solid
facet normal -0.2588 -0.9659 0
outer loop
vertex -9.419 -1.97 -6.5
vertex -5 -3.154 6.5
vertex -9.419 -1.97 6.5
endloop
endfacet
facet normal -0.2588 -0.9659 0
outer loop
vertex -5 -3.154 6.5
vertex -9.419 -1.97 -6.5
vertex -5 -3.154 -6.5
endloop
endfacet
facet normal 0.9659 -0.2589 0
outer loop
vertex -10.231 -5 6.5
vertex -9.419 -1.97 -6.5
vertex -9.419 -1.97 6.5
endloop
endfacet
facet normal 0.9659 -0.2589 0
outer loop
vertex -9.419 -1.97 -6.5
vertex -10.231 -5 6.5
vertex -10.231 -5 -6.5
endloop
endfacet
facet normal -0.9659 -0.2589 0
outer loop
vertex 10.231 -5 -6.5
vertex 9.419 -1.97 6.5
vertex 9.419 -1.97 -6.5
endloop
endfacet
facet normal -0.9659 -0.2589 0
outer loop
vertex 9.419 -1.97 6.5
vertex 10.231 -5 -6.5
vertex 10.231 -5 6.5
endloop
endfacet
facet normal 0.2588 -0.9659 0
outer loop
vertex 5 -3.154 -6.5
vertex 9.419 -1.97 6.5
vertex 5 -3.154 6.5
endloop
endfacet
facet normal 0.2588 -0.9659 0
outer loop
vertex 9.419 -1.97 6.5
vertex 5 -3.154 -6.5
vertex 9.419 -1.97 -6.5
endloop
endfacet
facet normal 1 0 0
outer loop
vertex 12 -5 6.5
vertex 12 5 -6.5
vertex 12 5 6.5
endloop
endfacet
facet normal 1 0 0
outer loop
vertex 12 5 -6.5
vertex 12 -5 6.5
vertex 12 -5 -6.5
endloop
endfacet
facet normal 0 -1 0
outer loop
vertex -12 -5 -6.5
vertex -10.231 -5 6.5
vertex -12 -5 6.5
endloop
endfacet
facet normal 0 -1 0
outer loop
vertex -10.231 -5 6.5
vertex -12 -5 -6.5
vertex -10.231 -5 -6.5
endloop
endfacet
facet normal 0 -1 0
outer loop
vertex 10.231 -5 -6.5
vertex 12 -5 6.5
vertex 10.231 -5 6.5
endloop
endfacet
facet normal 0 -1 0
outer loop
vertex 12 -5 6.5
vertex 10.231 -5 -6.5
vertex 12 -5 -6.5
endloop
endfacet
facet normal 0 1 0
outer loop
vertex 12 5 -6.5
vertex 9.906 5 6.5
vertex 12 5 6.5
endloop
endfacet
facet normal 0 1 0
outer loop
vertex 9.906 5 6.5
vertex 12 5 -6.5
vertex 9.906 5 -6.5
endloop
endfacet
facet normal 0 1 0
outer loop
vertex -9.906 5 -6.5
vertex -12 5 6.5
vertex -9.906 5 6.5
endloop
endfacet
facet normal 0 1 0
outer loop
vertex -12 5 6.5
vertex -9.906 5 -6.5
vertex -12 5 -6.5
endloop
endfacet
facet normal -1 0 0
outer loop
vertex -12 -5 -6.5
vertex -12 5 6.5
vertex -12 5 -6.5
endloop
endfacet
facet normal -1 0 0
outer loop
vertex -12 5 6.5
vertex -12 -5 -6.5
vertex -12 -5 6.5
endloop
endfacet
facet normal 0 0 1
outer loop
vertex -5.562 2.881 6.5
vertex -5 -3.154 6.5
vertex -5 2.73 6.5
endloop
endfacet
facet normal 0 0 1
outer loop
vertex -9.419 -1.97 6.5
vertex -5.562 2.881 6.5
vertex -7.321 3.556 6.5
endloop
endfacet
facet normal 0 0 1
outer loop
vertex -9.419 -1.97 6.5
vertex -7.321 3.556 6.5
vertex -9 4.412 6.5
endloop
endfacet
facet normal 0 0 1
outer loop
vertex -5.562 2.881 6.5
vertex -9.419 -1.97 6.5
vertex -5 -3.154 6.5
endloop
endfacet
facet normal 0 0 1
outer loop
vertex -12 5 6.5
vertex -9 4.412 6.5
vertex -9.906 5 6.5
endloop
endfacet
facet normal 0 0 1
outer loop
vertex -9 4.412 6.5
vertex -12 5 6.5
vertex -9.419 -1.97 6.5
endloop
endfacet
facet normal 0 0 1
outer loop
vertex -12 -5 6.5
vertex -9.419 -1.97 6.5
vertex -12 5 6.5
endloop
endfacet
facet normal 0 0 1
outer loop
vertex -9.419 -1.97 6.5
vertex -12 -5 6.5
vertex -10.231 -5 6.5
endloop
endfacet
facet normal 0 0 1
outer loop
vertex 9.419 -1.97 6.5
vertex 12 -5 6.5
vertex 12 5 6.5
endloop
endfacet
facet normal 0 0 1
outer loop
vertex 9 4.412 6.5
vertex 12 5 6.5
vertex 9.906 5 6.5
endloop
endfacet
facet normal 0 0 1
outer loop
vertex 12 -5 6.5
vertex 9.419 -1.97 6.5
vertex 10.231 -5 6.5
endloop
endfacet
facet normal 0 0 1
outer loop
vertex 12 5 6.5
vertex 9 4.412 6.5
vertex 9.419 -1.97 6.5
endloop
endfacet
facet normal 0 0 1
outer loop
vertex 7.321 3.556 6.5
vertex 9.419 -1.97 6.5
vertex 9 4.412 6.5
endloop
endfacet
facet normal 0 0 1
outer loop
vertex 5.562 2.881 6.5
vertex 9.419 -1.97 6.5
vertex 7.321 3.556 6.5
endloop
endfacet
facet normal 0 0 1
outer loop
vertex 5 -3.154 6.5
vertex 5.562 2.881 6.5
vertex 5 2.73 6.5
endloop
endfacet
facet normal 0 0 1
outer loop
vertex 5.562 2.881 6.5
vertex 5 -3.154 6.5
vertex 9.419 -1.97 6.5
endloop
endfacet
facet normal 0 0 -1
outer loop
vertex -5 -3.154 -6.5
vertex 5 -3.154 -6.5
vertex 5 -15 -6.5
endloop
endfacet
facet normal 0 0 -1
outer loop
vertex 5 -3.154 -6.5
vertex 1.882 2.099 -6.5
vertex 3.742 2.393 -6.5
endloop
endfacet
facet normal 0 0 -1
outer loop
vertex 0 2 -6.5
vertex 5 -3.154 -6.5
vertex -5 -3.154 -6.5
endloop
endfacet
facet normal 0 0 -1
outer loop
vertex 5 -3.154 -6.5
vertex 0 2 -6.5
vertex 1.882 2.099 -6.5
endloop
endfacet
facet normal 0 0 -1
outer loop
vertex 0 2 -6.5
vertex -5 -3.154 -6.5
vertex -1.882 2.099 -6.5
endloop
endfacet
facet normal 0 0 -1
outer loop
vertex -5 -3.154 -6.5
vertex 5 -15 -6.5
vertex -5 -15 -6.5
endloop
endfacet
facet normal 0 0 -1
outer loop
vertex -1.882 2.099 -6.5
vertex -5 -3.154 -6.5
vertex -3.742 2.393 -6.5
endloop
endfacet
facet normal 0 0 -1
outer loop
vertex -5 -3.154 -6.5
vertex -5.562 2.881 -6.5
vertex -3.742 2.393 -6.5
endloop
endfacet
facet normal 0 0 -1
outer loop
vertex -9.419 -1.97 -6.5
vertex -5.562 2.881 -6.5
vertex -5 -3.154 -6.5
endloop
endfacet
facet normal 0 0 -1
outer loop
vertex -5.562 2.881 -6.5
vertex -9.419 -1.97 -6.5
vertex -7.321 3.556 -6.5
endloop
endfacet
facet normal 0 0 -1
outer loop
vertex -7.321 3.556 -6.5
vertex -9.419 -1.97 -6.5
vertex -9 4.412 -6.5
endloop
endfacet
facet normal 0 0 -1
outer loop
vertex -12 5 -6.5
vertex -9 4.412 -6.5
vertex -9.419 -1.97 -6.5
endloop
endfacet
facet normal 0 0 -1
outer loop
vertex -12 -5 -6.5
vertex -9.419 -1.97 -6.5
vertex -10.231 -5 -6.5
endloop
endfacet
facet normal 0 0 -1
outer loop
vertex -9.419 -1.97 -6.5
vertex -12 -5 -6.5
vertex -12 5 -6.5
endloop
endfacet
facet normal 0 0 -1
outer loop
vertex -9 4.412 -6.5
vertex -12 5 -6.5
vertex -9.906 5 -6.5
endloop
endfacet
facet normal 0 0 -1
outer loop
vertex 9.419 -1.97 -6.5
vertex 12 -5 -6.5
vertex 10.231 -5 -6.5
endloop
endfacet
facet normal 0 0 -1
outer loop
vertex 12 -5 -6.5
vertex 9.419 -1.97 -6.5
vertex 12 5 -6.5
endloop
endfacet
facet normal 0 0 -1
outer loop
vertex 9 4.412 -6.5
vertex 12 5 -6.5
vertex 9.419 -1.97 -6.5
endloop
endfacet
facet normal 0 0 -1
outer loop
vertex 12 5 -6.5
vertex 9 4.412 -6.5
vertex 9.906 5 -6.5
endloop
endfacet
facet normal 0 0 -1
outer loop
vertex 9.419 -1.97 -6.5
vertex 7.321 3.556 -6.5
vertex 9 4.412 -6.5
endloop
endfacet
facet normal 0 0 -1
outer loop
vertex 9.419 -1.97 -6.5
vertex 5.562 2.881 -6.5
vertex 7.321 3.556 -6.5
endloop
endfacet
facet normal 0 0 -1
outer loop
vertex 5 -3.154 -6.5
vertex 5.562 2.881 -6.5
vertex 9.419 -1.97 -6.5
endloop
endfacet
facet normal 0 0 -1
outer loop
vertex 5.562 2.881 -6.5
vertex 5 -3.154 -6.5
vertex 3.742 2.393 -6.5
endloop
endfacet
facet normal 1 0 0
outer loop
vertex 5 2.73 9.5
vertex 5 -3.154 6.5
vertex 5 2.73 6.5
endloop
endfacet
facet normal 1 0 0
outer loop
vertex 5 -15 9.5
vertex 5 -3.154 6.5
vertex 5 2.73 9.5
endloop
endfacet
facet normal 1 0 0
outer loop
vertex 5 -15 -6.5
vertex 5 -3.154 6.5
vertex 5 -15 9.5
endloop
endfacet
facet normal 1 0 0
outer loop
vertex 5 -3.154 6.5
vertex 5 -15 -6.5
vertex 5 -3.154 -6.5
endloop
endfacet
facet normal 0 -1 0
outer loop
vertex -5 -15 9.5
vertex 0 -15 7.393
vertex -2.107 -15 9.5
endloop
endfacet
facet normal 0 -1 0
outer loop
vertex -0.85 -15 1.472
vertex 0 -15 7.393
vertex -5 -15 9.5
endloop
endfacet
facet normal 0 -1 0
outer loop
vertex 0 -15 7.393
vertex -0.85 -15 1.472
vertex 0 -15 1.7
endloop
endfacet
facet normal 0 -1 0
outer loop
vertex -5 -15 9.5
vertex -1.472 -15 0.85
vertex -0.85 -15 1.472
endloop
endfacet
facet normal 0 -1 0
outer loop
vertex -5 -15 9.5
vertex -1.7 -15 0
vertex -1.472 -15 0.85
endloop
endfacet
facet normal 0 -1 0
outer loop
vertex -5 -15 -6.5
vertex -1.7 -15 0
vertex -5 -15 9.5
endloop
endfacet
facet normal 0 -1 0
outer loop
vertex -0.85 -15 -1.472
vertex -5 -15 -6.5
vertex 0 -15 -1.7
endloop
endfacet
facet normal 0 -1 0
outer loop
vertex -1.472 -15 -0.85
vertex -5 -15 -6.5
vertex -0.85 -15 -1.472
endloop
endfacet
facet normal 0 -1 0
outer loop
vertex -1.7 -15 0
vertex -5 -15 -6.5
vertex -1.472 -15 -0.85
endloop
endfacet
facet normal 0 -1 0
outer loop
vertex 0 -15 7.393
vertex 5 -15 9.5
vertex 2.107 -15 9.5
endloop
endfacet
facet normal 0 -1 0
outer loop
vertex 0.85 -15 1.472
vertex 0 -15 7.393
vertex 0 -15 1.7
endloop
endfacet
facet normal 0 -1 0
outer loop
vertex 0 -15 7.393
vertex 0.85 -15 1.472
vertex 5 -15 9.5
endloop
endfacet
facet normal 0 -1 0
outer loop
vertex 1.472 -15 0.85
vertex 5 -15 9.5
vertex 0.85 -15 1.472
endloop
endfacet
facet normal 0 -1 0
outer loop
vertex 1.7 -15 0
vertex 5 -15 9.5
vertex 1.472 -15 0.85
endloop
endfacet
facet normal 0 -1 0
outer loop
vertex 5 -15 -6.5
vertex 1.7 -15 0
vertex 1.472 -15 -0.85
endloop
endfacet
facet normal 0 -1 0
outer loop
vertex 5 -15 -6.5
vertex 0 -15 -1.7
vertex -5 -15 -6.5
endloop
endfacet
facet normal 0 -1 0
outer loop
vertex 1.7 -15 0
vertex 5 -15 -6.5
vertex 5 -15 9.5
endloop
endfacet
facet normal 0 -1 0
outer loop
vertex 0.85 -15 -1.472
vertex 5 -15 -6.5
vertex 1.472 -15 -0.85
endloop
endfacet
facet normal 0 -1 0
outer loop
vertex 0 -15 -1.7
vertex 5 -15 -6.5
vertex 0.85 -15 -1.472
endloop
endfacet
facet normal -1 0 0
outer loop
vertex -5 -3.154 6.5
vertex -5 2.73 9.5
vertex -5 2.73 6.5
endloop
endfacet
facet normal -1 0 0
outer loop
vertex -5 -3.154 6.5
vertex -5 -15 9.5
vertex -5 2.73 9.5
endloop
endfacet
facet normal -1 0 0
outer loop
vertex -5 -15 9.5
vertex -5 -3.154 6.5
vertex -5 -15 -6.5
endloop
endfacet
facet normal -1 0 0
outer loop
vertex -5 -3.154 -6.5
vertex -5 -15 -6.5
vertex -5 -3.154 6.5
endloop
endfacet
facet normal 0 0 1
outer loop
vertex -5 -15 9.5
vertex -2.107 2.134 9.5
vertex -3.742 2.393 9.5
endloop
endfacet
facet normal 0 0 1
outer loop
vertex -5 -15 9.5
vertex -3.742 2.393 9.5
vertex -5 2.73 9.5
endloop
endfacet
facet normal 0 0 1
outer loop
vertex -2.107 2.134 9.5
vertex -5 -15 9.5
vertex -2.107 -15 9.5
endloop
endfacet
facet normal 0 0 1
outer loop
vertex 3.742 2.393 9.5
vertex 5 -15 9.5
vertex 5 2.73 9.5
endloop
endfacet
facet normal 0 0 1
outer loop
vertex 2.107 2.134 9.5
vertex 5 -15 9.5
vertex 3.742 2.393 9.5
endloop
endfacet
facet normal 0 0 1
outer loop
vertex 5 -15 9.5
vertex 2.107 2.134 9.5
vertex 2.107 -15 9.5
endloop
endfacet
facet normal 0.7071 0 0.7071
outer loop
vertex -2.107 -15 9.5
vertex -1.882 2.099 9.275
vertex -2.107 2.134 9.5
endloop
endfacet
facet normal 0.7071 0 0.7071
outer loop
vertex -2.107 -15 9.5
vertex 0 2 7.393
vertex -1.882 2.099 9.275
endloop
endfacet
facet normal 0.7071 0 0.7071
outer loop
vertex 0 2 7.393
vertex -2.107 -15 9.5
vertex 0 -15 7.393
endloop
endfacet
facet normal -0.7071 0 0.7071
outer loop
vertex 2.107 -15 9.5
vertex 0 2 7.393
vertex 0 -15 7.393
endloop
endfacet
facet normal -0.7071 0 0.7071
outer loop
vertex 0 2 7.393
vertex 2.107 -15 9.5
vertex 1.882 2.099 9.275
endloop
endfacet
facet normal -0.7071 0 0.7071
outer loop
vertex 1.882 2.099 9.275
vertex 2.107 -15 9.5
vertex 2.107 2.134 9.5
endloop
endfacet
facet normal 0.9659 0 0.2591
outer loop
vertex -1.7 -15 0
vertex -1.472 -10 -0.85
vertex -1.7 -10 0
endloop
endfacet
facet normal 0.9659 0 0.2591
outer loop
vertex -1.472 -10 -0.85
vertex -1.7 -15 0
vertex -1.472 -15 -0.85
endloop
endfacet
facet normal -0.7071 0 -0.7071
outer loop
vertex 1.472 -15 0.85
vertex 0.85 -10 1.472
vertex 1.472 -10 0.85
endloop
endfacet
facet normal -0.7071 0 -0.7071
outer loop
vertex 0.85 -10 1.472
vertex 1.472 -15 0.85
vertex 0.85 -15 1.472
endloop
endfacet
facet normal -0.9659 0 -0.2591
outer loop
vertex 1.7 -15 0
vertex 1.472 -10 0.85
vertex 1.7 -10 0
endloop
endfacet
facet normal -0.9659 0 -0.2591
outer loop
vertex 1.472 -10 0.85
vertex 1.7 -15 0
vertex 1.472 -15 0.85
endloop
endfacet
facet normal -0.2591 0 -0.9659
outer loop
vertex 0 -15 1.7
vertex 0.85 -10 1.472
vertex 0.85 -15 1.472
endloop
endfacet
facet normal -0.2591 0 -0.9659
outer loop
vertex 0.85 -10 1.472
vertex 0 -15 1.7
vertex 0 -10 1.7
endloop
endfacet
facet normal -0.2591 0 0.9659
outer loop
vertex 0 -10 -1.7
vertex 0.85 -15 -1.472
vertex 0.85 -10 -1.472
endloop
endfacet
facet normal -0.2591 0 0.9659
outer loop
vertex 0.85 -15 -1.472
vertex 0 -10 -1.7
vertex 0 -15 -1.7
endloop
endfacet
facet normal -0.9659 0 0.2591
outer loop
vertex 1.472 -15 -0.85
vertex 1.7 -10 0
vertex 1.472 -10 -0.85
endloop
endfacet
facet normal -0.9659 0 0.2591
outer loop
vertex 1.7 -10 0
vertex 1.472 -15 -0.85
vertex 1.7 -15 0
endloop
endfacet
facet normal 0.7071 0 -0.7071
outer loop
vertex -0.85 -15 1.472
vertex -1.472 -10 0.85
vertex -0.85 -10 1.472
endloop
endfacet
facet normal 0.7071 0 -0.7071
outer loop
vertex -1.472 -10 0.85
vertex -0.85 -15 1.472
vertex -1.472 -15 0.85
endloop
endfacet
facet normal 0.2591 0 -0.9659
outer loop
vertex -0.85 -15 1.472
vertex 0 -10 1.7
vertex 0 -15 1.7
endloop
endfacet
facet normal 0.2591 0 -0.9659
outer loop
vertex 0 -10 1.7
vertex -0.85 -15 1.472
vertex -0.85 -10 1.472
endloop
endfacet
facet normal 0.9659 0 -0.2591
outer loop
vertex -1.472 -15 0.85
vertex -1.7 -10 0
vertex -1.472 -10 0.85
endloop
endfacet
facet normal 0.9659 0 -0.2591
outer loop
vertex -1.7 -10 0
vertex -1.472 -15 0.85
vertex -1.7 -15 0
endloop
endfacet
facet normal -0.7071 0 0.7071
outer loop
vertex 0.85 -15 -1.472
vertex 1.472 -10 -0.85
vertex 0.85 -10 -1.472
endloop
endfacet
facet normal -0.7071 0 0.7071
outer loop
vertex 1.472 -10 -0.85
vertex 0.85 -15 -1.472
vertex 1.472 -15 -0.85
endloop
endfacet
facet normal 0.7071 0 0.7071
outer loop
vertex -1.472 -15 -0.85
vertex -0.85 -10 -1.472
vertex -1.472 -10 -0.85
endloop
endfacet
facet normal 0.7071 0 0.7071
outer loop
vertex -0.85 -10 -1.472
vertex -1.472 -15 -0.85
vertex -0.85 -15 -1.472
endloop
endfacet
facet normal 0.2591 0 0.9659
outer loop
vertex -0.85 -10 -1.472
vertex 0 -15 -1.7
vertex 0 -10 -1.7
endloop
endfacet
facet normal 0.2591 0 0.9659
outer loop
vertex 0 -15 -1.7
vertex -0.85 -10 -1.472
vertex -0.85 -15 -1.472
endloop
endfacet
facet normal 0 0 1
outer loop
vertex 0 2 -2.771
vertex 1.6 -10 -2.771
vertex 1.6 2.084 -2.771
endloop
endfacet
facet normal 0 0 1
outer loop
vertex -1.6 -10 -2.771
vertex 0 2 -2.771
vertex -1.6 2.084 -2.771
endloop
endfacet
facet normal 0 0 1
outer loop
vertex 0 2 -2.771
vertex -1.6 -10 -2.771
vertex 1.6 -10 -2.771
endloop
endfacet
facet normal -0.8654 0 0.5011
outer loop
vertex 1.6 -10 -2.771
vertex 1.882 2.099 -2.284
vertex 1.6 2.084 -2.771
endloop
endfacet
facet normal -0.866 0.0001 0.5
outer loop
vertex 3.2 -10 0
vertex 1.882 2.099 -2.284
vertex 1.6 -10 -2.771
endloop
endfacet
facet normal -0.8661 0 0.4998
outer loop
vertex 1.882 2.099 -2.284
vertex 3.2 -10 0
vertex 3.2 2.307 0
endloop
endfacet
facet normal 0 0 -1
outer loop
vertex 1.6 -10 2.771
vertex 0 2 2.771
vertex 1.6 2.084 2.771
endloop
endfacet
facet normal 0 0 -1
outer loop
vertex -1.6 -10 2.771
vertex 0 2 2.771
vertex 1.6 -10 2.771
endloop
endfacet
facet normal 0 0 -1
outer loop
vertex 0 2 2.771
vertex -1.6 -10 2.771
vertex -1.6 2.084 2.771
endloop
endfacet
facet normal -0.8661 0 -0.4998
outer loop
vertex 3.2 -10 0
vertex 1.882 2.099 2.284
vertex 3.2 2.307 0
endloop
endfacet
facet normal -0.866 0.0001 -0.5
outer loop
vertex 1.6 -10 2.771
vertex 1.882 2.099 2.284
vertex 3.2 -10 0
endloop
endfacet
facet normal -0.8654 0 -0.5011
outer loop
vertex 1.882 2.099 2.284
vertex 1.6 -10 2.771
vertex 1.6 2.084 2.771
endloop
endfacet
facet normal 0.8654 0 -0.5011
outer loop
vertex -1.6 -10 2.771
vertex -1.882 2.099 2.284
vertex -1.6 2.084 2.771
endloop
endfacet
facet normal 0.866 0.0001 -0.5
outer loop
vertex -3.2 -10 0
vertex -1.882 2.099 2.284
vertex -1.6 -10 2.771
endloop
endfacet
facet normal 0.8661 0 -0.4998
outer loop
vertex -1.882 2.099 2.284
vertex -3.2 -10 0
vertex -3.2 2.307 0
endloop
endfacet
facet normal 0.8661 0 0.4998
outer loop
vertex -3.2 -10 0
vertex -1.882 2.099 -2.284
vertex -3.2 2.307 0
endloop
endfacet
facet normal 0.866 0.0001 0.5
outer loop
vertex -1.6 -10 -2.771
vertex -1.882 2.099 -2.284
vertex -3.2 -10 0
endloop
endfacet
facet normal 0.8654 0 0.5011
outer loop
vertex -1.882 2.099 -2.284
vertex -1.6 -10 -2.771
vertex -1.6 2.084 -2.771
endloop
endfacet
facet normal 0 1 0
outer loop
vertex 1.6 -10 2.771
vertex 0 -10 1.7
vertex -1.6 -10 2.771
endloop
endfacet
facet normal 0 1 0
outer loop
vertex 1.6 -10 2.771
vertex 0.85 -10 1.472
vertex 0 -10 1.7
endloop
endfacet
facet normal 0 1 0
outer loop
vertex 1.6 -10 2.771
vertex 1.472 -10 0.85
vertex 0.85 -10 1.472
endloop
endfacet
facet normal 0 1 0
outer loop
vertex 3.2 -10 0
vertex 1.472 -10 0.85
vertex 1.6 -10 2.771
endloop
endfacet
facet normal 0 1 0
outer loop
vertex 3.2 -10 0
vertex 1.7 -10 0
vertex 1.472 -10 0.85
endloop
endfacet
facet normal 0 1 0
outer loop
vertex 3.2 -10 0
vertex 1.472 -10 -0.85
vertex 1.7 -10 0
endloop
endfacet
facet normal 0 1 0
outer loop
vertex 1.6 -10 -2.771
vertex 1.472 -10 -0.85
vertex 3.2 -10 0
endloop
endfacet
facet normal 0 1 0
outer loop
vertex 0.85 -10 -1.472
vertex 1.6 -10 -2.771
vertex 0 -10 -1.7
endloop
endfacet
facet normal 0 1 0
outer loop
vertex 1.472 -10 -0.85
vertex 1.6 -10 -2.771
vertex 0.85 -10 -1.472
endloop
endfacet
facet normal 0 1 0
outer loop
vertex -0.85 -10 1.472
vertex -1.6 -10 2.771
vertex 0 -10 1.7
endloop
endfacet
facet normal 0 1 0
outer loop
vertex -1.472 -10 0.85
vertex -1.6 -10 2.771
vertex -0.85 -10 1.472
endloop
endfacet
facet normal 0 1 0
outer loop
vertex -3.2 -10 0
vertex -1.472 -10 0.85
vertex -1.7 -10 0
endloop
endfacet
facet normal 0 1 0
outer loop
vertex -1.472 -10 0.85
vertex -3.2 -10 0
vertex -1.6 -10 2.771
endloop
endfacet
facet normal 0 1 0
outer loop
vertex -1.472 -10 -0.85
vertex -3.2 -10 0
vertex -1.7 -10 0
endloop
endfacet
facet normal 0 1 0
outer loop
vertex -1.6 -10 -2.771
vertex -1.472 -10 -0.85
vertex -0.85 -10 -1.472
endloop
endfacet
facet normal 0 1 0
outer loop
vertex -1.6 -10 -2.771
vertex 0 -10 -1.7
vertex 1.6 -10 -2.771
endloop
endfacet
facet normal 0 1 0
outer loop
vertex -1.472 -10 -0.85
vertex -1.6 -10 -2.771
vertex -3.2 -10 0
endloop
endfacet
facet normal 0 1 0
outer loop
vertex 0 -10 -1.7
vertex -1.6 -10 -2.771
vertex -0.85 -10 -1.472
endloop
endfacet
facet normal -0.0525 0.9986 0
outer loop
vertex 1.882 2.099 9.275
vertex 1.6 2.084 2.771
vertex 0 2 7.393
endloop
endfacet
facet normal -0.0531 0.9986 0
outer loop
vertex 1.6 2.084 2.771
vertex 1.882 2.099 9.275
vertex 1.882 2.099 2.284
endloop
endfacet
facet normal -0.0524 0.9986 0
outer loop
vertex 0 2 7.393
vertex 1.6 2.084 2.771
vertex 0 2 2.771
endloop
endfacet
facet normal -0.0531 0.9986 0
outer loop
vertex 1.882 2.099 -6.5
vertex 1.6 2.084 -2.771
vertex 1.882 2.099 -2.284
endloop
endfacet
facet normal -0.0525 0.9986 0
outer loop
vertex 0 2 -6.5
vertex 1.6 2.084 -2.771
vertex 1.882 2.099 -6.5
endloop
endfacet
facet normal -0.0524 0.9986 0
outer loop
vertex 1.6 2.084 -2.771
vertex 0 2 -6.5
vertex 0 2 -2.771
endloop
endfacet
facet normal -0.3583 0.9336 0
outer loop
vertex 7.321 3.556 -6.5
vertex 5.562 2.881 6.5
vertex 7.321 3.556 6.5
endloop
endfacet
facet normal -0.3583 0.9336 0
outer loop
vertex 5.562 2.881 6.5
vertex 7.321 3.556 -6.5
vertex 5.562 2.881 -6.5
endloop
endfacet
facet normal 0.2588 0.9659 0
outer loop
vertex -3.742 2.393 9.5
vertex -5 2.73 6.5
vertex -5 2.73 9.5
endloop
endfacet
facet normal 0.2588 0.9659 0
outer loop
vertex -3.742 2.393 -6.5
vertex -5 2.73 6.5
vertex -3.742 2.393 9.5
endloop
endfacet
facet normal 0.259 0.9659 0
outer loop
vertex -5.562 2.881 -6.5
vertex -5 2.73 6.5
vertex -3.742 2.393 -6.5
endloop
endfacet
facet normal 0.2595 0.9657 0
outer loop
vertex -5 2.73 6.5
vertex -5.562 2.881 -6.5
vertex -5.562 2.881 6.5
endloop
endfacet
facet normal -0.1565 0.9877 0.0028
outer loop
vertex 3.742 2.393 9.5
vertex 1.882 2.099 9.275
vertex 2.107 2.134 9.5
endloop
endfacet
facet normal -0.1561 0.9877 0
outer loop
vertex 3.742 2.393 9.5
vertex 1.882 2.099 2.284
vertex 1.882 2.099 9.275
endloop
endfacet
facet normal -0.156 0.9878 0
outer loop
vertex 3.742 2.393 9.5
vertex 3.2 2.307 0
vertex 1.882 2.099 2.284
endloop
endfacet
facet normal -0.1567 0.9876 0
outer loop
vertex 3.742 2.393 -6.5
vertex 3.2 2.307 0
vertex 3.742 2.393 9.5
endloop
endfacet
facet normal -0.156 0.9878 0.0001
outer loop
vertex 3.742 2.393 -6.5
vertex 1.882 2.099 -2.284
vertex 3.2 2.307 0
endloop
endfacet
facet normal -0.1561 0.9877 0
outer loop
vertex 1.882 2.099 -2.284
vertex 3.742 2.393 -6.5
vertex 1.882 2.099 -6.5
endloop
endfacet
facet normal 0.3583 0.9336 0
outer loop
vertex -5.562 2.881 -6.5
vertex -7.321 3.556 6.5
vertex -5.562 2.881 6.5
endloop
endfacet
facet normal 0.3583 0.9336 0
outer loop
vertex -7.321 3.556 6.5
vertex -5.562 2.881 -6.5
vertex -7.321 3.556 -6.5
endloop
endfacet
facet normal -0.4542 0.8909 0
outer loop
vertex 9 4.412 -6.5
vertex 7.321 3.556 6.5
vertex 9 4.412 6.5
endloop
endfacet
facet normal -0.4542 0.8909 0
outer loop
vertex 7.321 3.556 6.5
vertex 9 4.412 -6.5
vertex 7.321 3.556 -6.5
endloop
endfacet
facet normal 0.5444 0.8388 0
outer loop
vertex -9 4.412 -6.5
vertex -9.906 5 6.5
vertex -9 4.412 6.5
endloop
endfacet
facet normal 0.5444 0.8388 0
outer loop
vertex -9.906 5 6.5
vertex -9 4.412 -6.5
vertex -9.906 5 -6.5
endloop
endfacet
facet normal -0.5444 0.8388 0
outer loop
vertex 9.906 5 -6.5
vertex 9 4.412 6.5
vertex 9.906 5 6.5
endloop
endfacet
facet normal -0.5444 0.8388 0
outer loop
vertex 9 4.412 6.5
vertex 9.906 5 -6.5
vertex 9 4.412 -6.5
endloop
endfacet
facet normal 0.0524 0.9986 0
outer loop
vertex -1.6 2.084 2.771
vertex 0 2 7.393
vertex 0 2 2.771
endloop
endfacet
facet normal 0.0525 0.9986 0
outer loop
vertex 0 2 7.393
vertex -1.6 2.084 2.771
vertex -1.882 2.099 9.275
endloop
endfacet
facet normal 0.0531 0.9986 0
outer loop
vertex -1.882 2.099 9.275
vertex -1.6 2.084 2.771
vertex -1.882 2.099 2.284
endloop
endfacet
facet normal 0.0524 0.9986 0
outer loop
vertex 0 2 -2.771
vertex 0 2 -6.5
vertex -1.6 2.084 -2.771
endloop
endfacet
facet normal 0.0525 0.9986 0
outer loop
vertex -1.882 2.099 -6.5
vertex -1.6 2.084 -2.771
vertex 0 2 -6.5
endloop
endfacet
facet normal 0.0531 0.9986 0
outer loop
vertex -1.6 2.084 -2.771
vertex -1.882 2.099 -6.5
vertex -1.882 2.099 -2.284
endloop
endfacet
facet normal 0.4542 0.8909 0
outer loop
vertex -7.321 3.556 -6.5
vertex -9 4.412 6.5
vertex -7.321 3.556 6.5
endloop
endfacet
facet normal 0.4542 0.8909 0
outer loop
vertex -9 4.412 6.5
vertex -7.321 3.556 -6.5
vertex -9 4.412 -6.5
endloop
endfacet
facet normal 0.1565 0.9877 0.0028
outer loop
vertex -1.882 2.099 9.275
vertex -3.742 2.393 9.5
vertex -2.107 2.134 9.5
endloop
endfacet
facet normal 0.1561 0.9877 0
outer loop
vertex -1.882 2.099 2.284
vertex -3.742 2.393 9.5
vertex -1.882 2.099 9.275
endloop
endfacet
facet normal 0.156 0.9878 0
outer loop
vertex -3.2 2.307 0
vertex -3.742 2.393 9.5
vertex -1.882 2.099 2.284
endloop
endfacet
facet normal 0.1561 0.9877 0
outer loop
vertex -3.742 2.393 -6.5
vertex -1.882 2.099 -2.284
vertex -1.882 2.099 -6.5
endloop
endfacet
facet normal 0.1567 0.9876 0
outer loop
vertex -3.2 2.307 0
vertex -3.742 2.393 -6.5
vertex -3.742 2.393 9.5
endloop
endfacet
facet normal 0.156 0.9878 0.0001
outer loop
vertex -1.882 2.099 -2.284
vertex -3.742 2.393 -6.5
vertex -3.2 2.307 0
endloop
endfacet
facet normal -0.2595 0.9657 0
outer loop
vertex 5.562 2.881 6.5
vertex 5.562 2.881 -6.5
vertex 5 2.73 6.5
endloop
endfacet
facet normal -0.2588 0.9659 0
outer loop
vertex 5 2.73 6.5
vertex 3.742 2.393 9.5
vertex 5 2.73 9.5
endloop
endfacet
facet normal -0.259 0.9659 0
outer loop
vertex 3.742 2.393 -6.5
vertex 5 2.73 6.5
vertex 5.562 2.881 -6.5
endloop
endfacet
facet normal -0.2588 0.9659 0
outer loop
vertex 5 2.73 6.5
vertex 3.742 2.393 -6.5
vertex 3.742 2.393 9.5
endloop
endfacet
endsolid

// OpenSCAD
module tensioner() {
  difference() {
    union() {
      difference() {
	cube([24, 13, 10], center=true);
	for (a = [-15, 15]) {
	  translate([0, 0, -10]) rotate([0, a, 0])
	    translate([0, 0, 20]) cube([12, 20, 12], center=true);
	}
      }
      translate([0, 1.5, 5]) cube([10, 16, 20], center=true);
    }
    translate([0, 18, 0]) rotate([0, 0, 45])
      cube([15, 15, 50], center=true);
    cylinder(r=1.7, h=50, center=true, $fn=12);
    cylinder(r=3.2, h=20, center=true, $fn=6);
    translate([0, 0, -20]) rotate([90, 0, 0])
      cylinder(r=18, h=30, center=true, $fn=60);
  }
}

rotate([90, 0, 0]) tensioner();
